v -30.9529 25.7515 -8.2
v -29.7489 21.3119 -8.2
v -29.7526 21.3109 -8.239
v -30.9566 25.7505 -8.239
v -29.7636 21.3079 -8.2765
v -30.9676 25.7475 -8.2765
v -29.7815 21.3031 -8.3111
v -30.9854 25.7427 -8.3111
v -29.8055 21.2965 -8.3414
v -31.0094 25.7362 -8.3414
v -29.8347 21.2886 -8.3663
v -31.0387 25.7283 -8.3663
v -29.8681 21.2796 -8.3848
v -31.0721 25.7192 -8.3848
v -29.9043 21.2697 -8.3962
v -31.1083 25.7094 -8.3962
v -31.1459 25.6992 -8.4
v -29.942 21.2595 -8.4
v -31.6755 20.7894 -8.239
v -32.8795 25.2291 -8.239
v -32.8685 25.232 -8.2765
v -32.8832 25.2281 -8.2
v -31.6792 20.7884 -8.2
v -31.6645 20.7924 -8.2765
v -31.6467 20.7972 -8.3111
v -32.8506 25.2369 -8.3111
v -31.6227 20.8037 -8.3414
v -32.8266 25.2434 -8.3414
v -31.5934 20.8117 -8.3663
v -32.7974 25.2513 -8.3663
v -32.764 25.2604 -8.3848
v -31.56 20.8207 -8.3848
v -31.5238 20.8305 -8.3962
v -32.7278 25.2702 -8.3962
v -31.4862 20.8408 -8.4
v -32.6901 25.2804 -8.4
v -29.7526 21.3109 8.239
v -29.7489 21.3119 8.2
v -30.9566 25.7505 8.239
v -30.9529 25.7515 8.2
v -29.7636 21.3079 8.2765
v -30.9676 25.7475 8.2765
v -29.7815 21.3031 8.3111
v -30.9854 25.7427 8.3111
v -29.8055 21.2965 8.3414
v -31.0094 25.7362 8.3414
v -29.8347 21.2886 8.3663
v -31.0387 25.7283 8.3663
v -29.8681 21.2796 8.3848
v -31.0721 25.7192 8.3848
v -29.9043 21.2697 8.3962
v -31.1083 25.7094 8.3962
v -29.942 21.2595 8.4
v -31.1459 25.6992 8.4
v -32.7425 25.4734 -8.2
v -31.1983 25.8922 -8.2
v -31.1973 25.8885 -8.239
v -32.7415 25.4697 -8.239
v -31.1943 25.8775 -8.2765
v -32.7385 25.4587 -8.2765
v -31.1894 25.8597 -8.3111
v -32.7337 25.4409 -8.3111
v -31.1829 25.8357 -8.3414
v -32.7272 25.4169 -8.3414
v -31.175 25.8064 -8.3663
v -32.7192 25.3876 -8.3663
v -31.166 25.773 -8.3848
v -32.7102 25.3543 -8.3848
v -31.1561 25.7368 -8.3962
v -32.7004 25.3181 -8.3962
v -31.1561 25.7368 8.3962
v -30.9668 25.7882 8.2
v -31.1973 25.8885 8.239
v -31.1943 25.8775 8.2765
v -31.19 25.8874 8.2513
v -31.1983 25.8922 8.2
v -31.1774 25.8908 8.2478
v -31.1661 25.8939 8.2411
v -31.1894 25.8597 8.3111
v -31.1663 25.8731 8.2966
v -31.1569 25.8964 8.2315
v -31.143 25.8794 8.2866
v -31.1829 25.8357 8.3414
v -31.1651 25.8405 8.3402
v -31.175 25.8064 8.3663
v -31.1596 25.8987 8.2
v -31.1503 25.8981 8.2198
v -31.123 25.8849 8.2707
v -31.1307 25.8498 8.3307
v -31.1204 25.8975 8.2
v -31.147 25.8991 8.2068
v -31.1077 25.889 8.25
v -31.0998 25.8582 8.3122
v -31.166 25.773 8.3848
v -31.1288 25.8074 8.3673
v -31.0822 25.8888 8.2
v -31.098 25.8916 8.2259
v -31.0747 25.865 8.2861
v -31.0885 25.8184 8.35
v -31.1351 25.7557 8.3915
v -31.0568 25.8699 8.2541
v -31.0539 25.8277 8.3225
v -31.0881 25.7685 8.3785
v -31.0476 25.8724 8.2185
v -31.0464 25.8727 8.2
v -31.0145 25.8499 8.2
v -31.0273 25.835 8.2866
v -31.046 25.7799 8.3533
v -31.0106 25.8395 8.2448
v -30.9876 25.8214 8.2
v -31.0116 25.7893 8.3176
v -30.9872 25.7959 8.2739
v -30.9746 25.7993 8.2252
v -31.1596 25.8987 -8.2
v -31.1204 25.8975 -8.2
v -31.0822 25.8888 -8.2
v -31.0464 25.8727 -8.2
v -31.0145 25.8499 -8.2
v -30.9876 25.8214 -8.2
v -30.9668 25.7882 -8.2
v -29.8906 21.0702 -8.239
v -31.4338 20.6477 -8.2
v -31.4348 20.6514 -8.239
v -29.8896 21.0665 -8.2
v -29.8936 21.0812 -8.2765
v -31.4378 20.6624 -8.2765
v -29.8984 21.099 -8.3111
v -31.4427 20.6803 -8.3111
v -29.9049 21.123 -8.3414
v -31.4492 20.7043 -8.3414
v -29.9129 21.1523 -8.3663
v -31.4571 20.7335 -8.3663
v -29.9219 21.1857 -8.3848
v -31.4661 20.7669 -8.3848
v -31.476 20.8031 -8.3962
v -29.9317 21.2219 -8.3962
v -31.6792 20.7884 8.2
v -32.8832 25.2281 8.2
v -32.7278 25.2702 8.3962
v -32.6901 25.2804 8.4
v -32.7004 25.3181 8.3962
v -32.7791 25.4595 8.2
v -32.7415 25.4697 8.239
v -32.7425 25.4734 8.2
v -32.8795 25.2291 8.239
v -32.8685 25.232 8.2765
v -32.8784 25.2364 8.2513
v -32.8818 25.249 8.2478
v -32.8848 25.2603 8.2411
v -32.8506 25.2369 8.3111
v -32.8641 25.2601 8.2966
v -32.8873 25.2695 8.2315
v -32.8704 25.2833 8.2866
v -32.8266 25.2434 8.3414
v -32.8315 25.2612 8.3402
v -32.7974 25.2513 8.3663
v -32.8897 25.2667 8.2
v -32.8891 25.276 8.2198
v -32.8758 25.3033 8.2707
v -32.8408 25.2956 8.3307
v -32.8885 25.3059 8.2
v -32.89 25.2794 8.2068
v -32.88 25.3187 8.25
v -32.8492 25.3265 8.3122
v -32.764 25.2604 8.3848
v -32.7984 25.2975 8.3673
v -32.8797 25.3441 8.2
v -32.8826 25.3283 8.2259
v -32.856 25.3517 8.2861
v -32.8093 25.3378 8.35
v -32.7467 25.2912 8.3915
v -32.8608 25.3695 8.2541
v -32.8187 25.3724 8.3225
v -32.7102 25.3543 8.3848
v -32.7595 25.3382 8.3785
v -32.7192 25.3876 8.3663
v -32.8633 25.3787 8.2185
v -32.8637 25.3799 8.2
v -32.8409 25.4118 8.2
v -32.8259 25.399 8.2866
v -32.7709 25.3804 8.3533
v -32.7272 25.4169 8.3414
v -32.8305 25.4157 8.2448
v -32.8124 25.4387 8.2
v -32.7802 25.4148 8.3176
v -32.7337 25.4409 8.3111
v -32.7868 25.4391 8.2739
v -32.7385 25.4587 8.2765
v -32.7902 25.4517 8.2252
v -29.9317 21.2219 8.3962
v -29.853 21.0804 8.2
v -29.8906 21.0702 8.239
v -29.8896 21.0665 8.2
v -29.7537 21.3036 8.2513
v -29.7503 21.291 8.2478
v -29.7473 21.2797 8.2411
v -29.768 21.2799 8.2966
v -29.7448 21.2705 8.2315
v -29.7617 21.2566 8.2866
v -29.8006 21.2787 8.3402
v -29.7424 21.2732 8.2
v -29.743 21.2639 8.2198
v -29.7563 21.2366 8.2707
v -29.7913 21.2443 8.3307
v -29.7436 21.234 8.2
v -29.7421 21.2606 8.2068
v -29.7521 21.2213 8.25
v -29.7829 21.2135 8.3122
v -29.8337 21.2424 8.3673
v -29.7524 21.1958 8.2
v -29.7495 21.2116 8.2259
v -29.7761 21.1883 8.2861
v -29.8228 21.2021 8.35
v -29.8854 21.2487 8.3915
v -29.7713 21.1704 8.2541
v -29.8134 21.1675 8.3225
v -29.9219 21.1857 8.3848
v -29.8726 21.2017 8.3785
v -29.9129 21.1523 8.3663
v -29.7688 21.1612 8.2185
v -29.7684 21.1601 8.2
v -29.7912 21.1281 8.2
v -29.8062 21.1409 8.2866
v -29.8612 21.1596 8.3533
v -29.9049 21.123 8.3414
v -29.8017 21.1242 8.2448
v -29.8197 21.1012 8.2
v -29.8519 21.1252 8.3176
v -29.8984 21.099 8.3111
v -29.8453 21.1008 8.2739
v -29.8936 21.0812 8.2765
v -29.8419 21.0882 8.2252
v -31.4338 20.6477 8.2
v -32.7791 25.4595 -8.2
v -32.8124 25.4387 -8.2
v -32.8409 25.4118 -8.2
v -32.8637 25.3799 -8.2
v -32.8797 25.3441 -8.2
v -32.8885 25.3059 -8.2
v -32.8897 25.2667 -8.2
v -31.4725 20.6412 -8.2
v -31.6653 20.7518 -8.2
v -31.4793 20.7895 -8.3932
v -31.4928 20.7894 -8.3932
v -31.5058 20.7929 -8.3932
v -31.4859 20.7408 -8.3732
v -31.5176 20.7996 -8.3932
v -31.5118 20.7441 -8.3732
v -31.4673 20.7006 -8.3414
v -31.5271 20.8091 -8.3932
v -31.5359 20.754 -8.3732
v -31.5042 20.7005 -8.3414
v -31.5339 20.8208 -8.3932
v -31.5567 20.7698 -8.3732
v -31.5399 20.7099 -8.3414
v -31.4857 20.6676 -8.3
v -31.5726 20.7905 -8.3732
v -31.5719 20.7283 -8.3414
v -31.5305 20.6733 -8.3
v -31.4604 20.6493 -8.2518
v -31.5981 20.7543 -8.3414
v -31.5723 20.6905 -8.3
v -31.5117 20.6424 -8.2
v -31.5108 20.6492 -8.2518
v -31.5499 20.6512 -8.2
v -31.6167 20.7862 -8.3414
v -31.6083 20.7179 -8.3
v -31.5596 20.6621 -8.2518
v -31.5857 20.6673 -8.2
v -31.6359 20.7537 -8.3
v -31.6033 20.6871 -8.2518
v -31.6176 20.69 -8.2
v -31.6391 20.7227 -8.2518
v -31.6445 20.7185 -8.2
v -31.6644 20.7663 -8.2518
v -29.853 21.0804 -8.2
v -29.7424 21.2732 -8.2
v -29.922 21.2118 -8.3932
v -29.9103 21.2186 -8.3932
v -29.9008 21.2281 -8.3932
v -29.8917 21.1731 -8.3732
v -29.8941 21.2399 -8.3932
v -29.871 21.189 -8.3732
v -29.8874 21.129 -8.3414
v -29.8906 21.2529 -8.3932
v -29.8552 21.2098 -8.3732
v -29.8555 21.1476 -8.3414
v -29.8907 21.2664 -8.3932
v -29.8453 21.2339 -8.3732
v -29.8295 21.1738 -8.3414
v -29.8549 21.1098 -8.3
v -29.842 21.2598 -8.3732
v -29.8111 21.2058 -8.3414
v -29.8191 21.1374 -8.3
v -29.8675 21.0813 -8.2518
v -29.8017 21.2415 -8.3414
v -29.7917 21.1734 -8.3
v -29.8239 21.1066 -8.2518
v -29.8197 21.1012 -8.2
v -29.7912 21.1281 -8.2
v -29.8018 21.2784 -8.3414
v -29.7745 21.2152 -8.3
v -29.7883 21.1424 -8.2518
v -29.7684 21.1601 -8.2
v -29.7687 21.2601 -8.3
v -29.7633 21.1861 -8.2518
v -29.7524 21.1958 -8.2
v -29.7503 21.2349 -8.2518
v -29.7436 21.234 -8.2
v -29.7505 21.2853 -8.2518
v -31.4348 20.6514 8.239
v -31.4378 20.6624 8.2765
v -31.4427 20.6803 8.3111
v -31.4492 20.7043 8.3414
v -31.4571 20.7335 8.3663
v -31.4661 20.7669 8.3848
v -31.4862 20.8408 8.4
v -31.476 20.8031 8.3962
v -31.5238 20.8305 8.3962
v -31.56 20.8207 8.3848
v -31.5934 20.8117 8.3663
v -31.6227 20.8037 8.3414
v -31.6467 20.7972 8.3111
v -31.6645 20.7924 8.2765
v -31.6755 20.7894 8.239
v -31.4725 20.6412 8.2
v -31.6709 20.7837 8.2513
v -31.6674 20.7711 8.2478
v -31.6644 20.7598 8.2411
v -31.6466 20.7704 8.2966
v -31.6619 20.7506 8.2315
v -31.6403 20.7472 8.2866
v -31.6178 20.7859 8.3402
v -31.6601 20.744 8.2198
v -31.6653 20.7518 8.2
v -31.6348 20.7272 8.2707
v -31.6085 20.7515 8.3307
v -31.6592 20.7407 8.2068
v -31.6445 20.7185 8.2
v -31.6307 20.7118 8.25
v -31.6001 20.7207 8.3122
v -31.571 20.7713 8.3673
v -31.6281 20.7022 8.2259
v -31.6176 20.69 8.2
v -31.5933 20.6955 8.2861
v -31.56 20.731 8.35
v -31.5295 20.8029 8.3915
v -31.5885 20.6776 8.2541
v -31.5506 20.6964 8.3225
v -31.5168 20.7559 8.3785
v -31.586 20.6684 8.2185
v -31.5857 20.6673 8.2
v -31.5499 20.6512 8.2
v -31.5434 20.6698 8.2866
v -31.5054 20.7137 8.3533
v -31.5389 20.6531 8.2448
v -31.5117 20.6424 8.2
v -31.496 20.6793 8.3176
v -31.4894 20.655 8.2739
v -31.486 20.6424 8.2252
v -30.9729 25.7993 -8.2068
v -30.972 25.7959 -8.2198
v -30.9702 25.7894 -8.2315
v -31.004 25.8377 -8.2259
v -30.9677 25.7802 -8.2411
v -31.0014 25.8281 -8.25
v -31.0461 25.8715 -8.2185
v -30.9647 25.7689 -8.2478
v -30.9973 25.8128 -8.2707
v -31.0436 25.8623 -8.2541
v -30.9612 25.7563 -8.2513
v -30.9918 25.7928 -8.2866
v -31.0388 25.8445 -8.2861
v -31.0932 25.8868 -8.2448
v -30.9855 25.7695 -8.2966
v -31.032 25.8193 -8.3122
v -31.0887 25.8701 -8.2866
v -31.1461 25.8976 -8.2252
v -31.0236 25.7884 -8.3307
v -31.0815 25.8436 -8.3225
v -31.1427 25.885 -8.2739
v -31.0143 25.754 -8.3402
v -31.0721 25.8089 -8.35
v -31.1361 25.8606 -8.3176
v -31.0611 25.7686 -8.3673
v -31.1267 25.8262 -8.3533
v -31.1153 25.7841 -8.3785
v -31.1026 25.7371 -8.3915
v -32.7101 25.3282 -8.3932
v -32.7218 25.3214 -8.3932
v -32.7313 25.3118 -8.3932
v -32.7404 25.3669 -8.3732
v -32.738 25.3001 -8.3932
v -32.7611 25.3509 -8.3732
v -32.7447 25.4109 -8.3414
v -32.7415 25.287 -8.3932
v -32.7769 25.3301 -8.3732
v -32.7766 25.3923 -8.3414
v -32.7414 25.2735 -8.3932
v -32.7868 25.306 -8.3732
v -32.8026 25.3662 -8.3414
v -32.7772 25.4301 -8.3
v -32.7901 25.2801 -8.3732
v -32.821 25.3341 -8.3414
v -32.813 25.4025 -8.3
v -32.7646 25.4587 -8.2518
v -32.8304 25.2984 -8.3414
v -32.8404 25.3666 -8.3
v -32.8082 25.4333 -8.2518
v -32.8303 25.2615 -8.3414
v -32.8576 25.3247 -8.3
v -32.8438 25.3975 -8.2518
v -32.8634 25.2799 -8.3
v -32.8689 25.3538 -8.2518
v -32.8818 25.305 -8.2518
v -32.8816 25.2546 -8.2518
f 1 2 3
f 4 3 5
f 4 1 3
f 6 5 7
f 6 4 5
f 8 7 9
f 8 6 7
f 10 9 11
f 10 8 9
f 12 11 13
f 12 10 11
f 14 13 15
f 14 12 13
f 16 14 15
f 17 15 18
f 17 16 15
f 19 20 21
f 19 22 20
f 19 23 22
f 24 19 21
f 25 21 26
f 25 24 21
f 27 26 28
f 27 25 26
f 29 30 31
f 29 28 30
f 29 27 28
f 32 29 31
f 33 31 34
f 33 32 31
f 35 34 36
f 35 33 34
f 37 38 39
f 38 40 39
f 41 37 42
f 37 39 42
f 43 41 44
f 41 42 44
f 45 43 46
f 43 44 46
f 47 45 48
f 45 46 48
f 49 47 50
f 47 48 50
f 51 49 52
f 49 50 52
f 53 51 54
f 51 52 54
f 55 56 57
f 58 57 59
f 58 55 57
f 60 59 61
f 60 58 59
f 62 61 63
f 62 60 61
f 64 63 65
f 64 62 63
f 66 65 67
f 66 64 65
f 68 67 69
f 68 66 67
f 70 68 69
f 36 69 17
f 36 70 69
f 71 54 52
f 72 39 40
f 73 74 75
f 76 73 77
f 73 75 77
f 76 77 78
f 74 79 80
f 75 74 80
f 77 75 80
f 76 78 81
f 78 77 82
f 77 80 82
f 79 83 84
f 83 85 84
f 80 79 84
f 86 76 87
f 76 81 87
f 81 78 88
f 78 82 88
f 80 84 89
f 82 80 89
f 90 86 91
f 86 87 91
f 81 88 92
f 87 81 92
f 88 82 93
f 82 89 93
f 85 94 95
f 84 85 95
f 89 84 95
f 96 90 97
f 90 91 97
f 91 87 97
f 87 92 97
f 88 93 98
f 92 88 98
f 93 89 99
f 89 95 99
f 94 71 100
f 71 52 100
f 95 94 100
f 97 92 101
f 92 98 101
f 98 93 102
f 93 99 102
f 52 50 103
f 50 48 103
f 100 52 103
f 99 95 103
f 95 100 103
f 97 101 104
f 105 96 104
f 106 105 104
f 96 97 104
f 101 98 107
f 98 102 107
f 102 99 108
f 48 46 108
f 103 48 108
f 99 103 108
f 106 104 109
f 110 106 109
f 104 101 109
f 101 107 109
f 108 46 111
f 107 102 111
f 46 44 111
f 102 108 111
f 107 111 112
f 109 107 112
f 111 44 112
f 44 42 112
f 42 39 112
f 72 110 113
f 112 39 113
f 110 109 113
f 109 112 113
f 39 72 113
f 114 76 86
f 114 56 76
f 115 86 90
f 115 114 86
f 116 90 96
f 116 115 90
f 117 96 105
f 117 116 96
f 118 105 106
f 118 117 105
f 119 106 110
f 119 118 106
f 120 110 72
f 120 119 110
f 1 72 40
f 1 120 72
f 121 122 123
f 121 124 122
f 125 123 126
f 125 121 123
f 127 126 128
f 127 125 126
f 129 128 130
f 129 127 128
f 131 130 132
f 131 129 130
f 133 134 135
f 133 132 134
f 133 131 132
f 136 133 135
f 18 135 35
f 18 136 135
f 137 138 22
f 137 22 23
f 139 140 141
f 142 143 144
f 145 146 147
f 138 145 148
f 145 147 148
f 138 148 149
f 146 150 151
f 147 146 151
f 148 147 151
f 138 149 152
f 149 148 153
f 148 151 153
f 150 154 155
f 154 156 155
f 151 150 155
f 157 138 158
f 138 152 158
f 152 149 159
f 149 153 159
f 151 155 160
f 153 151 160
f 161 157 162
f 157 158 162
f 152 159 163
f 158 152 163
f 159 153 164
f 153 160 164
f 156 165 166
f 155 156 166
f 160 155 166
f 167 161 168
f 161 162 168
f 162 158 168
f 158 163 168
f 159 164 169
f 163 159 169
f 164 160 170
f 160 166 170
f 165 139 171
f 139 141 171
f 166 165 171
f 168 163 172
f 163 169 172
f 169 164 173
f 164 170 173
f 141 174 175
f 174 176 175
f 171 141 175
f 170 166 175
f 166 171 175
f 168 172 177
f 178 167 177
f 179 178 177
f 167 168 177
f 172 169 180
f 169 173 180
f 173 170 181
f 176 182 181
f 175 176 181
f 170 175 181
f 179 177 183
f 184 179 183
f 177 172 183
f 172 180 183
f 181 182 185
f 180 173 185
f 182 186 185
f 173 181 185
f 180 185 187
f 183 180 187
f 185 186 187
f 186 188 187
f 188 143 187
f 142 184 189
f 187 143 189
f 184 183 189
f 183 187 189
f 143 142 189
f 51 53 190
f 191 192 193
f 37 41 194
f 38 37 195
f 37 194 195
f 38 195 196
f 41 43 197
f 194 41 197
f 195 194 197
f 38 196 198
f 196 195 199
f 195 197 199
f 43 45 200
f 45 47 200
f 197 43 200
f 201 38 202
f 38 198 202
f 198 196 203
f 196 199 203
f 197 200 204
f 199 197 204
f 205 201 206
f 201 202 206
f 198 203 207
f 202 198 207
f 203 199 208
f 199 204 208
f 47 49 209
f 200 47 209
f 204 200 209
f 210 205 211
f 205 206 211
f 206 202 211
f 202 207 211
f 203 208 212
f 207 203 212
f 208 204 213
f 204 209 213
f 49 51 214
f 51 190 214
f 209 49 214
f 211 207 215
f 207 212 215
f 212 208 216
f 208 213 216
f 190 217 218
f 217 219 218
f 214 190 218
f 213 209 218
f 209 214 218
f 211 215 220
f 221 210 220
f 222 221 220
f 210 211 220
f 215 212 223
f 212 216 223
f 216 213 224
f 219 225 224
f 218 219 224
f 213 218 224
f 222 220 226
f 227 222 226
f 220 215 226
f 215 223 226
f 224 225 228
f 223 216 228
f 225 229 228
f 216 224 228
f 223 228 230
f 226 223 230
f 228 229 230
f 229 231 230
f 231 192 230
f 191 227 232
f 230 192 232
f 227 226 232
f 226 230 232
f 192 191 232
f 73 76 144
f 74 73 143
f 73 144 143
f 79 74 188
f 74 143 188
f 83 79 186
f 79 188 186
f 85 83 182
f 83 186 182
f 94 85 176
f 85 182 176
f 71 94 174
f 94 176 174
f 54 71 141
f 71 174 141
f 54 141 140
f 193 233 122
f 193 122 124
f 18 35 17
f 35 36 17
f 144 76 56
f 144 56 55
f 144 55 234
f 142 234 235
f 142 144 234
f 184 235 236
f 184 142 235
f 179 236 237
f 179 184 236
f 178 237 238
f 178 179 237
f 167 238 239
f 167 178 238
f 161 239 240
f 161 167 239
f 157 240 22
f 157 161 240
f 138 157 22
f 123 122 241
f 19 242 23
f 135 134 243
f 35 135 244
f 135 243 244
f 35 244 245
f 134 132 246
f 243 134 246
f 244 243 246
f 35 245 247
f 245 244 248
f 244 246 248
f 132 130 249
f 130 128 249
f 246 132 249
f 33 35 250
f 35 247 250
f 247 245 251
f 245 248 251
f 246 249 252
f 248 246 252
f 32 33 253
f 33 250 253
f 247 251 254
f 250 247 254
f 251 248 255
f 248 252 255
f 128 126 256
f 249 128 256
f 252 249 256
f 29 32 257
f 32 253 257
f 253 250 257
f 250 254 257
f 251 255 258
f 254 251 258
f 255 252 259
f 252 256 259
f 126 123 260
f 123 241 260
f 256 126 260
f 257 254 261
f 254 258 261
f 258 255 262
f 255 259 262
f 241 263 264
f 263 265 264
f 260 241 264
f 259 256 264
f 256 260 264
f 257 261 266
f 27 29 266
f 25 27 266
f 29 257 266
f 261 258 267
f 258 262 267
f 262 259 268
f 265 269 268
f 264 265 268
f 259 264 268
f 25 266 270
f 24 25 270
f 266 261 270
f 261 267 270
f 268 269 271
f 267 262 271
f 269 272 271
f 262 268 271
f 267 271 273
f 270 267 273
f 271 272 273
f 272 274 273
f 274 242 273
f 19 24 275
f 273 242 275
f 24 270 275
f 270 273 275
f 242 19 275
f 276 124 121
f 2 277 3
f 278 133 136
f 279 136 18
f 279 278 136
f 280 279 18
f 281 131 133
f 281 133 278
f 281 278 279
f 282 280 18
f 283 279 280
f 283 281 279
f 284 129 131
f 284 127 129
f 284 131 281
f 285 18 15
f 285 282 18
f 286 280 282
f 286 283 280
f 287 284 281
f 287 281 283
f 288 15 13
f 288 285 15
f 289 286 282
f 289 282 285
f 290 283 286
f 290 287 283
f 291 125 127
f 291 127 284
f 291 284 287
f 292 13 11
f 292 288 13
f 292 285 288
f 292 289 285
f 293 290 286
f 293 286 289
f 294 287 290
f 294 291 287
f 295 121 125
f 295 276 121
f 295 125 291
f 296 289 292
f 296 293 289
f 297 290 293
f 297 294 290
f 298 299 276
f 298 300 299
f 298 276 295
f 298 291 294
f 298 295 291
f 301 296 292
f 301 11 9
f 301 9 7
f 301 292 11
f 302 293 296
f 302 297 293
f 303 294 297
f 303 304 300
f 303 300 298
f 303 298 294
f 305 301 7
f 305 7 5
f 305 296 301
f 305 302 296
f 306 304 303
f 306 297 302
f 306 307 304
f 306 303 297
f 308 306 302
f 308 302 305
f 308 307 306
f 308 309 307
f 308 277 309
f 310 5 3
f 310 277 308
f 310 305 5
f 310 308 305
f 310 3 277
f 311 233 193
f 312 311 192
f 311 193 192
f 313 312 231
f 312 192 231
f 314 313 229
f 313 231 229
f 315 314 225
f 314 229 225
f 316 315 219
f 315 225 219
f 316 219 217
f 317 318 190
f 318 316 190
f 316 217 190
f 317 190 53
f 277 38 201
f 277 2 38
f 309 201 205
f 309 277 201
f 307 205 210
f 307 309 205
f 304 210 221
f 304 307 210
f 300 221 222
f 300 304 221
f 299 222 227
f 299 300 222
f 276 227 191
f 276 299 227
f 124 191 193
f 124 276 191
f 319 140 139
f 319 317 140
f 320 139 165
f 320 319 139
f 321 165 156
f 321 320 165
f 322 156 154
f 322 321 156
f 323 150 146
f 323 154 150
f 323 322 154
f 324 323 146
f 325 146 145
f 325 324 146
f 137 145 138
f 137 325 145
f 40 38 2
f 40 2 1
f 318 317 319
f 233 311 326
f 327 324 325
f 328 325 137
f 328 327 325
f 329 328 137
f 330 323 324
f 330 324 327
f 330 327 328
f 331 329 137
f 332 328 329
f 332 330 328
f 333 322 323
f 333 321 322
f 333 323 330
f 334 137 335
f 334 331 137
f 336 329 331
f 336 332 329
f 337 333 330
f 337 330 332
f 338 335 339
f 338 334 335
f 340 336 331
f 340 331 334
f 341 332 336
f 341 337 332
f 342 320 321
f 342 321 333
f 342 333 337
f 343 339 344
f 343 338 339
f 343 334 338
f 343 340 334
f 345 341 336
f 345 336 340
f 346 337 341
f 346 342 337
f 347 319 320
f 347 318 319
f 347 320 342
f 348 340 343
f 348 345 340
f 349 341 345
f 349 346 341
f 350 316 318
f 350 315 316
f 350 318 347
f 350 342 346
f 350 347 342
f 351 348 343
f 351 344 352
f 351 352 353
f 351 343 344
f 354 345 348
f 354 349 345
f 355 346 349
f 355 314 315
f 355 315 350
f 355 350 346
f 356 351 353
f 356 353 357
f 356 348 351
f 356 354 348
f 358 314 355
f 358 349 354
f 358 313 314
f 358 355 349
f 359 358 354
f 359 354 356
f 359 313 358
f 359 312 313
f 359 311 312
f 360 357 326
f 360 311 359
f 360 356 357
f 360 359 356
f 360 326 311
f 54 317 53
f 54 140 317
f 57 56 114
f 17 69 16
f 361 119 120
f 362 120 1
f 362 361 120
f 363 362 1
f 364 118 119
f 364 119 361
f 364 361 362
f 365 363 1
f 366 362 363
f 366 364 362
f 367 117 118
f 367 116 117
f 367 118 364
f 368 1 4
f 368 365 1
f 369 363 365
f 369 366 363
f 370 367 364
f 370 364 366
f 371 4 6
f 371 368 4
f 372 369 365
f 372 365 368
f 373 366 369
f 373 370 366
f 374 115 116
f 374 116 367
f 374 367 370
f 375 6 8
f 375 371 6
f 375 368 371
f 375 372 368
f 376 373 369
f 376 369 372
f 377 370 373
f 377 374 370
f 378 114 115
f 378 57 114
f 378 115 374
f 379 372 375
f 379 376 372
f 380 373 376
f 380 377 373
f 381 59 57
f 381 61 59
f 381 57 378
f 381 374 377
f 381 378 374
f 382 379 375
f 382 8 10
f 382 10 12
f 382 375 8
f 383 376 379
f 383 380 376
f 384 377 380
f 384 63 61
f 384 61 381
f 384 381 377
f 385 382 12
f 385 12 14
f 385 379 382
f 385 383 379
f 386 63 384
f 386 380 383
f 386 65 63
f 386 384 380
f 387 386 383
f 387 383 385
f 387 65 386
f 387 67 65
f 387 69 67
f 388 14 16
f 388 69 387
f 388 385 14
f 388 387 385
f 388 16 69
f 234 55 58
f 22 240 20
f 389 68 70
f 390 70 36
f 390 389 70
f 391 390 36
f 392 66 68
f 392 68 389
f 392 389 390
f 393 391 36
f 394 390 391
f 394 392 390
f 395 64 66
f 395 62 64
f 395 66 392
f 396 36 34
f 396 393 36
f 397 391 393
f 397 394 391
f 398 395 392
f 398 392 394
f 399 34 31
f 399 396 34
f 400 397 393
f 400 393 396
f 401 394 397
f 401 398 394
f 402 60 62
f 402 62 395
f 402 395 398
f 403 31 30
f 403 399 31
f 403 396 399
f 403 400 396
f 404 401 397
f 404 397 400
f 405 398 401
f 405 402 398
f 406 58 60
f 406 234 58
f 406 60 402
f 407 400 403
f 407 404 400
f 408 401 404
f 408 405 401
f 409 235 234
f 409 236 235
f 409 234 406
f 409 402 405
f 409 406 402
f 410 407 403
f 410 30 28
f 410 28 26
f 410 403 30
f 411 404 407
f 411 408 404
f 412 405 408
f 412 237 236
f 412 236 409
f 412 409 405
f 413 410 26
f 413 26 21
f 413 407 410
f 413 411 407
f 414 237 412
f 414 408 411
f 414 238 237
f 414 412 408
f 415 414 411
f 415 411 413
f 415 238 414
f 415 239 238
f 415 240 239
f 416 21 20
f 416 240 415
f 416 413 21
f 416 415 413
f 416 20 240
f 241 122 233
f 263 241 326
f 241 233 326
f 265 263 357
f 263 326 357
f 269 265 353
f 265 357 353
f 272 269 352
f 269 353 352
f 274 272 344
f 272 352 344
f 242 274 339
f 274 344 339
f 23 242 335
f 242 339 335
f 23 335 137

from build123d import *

# Parameters (mm, degrees)
F2_DEPTH = 8.4
F4_R     = 0.2


with BuildPart() as f2:
    # F1 (on Top) → F2 (new body)
    with BuildSketch(Plane.XY):
        Polygon((-31.005243456, 25.9445533505), (-32.9355241115, 25.4210874101), (-31.6268592603, 20.5953857712), (-29.6965786048, 21.1188517117), align=None)
    extrude(amount=F2_DEPTH)

    # F3: F2 across plane


with BuildPart() as f2_1:
    add(f2.part)
    add(f2.part.mirror(Plane.XY))

    # F4
    f4_edges = [f2_1.edges().sort_by_distance(p)[0] for p in [
        (-30.661719, 20.857119, 8.4),
        (-30.350911, 23.531703, 8.4),
        (-31.970384, 25.68282, 8.4),
        (-32.281192, 23.008237, 8.4),
        (-31.626859, 20.595386, 0),
        (-29.696579, 21.118852, 0),
        (-30.661719, 20.857119, -8.4),
        (-32.935524, 25.421087, 0),
        (-31.970384, 25.68282, -8.4),
        (-31.005243, 25.944553, 0),
        (-30.350911, 23.531703, -8.4),
        (-32.281192, 23.008237, -8.4),
    ]]
    fillet(f4_edges, radius=F4_R)


solid = f2_1.part
